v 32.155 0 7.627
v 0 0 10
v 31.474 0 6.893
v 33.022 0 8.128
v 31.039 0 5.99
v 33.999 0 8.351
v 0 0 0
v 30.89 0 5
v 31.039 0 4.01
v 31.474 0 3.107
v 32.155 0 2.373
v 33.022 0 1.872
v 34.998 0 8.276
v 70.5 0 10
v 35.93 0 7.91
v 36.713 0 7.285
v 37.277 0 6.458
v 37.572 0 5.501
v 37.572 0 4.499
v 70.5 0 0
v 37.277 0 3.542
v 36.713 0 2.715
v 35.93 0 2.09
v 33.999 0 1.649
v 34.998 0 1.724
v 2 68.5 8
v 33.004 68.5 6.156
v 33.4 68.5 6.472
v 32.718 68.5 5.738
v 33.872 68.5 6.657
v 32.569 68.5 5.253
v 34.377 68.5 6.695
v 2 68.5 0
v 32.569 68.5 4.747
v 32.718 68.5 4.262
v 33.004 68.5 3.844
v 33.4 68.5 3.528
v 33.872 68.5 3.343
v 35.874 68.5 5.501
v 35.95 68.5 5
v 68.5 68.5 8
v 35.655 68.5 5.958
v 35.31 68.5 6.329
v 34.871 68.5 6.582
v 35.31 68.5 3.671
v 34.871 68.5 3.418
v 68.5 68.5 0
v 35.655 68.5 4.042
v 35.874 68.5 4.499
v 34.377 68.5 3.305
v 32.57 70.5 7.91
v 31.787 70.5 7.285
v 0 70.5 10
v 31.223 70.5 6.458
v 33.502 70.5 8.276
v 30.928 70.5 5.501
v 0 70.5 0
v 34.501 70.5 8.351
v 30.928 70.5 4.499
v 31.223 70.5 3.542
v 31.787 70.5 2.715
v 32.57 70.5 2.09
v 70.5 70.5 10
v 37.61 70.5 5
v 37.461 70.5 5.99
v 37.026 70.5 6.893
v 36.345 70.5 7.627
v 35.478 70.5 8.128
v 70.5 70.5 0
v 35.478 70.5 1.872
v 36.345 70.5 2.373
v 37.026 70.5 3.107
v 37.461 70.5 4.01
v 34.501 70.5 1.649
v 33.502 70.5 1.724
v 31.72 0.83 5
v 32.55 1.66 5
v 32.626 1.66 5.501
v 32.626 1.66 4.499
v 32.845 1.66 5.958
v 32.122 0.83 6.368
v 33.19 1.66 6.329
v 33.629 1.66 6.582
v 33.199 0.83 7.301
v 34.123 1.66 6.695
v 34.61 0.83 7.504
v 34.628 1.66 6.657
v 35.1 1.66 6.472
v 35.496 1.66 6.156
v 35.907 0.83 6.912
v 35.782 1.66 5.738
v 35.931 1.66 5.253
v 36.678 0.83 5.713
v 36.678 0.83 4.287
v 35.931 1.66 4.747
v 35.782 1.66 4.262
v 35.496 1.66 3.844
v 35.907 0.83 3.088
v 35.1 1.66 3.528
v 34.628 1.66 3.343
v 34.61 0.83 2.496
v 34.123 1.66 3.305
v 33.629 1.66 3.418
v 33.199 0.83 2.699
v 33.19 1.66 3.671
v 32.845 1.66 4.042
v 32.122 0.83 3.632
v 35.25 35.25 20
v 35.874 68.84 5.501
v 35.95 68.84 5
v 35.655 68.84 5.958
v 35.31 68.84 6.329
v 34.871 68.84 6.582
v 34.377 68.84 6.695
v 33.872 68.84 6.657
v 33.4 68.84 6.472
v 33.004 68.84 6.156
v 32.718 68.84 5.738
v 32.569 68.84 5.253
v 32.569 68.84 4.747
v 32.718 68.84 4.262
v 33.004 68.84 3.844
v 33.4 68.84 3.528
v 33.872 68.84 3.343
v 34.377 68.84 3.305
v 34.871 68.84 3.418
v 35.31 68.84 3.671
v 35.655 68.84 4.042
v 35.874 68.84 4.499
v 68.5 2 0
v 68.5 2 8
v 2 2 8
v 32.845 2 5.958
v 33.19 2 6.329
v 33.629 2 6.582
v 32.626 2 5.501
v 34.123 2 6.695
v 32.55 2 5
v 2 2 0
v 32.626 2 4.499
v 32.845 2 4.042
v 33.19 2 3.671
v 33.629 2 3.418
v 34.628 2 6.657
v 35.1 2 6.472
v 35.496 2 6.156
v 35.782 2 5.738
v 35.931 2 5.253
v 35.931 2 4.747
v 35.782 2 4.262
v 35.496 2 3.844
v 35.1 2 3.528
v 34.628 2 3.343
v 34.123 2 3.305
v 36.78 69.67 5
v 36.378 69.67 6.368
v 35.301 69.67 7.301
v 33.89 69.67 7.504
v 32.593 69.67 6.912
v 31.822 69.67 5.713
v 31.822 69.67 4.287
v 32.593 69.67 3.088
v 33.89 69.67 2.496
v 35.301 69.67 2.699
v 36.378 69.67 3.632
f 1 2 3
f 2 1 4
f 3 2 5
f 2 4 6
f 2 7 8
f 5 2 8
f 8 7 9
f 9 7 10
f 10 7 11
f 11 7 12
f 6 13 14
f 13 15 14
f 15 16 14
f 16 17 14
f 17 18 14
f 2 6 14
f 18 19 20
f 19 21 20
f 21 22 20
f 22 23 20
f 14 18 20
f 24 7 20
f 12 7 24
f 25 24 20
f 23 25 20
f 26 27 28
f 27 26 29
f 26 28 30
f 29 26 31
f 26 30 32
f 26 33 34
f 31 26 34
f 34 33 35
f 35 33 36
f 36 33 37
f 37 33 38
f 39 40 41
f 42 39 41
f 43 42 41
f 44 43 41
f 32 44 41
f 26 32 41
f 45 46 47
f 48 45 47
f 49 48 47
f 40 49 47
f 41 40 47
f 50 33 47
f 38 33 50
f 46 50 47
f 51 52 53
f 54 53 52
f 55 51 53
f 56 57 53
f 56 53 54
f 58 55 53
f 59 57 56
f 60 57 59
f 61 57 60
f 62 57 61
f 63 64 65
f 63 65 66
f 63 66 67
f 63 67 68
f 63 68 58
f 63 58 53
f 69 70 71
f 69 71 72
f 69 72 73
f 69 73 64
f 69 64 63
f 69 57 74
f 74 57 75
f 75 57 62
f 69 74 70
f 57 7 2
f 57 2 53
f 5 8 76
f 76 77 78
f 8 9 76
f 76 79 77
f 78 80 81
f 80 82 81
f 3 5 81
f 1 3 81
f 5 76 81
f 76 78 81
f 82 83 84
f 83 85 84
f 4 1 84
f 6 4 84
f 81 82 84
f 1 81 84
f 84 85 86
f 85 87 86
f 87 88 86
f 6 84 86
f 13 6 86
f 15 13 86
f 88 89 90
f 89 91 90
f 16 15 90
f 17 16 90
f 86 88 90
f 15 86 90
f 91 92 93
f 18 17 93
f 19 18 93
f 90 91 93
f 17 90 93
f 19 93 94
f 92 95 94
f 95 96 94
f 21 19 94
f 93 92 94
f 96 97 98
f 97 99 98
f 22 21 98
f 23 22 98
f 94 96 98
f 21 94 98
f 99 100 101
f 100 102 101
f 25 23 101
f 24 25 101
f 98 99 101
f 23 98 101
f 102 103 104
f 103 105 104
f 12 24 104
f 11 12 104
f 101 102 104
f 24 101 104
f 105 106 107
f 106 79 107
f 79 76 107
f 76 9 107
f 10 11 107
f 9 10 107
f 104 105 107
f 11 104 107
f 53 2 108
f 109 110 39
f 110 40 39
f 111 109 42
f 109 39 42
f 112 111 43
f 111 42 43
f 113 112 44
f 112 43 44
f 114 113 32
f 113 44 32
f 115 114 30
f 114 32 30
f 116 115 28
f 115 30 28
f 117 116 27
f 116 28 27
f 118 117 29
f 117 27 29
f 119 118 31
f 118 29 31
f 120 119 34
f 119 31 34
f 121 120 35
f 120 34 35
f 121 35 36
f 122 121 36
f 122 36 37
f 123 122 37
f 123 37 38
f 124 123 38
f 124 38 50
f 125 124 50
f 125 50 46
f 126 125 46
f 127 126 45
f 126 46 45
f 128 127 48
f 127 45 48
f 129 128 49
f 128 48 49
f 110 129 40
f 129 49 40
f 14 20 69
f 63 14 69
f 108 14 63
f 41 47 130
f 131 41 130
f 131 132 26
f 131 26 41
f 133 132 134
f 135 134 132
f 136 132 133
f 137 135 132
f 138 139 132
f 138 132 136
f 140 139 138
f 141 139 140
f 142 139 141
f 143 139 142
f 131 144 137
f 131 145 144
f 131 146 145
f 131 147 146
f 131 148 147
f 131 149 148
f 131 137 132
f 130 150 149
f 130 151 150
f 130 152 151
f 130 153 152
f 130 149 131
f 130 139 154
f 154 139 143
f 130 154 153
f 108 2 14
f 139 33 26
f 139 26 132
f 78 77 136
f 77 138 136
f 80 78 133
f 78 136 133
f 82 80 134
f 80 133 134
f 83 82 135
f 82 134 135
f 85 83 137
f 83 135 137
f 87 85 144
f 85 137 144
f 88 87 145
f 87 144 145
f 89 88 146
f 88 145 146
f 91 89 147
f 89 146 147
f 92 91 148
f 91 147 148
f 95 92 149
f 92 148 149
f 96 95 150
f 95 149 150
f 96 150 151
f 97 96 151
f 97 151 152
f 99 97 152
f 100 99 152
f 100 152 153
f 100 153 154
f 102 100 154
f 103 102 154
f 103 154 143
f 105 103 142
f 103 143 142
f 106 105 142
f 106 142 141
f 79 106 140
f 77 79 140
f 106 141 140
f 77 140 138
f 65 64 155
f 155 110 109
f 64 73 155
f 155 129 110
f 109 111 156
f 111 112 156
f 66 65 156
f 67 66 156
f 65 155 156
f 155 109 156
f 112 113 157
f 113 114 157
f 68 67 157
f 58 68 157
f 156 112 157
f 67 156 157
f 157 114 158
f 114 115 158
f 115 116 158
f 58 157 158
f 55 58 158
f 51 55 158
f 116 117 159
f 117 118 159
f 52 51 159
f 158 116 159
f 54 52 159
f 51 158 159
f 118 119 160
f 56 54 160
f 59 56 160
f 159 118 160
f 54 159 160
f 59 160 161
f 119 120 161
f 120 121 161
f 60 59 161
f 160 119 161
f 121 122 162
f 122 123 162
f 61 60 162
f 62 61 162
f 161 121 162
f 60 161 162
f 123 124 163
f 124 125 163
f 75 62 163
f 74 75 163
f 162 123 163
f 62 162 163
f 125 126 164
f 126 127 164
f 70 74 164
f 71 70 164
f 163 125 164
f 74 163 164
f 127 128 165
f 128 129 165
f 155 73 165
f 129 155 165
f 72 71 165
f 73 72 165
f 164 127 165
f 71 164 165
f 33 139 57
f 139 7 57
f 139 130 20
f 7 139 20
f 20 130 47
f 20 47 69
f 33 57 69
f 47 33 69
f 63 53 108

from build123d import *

# Parameters (mm, degrees)
F0_W                 = 70.5
F0_H                 = 70.5
F1_DEPTH             = 10
F2_W                 = 70.5
F2_H                 = 70.5
F3_DEPTH             = 10
F4_SIZE2             = 9.99999
F4_SIZE              = 35.24999
F5_W                 = 66.5
F5_H                 = 66.5
F6_DEPTH             = 8
F9_D                 = 3.4
F9_DEPTH             = 12
F9_CSINK_D           = 6.72
F9_CSINK_ANGLE       = 90
F9_TIP               = 1.0214630523
F9_ON_F8_D           = 3.4
F9_ON_F8_DEPTH       = 12
F9_ON_F8_CSINK_D     = 6.72
F9_ON_F8_CSINK_ANGLE = 90
F9_ON_F8_TIP         = 1.0214630523


# Not quite as in the source:
# - a fillet or chamfer is up to 0.001 mm smaller than in the source, because OpenCascade refuses the exact size


with BuildPart() as f1:
    # F0 (on Top) → F1 (new body)
    with BuildSketch(Plane.XY):
        with Locations((35.25, 35.25)):
            Rectangle(F0_W, F0_H)
    extrude(amount=F1_DEPTH)

    # F2 (on face) → F3 (join)
    with BuildSketch(Plane.XY.offset(10)):
        with Locations((35.25, 35.25)):
            Rectangle(F2_W, F2_H)
    extrude(amount=F3_DEPTH)

    # F4 (size 35.25 and 10 in the source; OpenCascade refuses exactly that, so slightly less here)
    f4_edges = [f1.edges().sort_by_distance(p)[0] for p in [
        (35.25, 70.5, 20),
        (0, 35.25, 20),
        (35.25, 0, 20),
        (70.5, 35.25, 20),
    ]]
    f4_side = f1.faces().sort_by_distance((35.25, 35.25, 20))[0]
    chamfer(f4_edges, length=F4_SIZE, length2=F4_SIZE2, reference=f4_side)

    # F5 (on face) → F6 (cut)
    with BuildSketch(Plane(origin=(0, 0, 0), x_dir=(1, 0, 0), z_dir=(0, 0, -1))):
        with Locations((35.25, -35.25)):
            Rectangle(F5_W, F5_H)
    extrude(amount=-F6_DEPTH, mode=Mode.SUBTRACT)

    # F9
    with Locations(Plane.XZ):
        with Locations((34.25, 5)):
            CounterSinkHole(F9_D / 2, F9_CSINK_D / 2, depth=F9_DEPTH, counter_sink_angle=F9_CSINK_ANGLE)
            with Locations((0, 0, -(F9_DEPTH + F9_TIP / 2))):  # 118° drill point
                Cone(0, F9_D / 2, F9_TIP, mode=Mode.SUBTRACT)

    # F9 on F8
    with Locations(Plane(origin=(0, 70.5, 0), x_dir=(-1, 0, 0), z_dir=(0, 1, 0))):
        with Locations((-34.25, 5)):
            CounterSinkHole(F9_ON_F8_D / 2, F9_ON_F8_CSINK_D / 2, depth=F9_ON_F8_DEPTH, counter_sink_angle=F9_ON_F8_CSINK_ANGLE)
            with Locations((0, 0, -(F9_ON_F8_DEPTH + F9_ON_F8_TIP / 2))):  # 118° drill point
                Cone(0, F9_ON_F8_D / 2, F9_ON_F8_TIP, mode=Mode.SUBTRACT)


solid = f1.part
